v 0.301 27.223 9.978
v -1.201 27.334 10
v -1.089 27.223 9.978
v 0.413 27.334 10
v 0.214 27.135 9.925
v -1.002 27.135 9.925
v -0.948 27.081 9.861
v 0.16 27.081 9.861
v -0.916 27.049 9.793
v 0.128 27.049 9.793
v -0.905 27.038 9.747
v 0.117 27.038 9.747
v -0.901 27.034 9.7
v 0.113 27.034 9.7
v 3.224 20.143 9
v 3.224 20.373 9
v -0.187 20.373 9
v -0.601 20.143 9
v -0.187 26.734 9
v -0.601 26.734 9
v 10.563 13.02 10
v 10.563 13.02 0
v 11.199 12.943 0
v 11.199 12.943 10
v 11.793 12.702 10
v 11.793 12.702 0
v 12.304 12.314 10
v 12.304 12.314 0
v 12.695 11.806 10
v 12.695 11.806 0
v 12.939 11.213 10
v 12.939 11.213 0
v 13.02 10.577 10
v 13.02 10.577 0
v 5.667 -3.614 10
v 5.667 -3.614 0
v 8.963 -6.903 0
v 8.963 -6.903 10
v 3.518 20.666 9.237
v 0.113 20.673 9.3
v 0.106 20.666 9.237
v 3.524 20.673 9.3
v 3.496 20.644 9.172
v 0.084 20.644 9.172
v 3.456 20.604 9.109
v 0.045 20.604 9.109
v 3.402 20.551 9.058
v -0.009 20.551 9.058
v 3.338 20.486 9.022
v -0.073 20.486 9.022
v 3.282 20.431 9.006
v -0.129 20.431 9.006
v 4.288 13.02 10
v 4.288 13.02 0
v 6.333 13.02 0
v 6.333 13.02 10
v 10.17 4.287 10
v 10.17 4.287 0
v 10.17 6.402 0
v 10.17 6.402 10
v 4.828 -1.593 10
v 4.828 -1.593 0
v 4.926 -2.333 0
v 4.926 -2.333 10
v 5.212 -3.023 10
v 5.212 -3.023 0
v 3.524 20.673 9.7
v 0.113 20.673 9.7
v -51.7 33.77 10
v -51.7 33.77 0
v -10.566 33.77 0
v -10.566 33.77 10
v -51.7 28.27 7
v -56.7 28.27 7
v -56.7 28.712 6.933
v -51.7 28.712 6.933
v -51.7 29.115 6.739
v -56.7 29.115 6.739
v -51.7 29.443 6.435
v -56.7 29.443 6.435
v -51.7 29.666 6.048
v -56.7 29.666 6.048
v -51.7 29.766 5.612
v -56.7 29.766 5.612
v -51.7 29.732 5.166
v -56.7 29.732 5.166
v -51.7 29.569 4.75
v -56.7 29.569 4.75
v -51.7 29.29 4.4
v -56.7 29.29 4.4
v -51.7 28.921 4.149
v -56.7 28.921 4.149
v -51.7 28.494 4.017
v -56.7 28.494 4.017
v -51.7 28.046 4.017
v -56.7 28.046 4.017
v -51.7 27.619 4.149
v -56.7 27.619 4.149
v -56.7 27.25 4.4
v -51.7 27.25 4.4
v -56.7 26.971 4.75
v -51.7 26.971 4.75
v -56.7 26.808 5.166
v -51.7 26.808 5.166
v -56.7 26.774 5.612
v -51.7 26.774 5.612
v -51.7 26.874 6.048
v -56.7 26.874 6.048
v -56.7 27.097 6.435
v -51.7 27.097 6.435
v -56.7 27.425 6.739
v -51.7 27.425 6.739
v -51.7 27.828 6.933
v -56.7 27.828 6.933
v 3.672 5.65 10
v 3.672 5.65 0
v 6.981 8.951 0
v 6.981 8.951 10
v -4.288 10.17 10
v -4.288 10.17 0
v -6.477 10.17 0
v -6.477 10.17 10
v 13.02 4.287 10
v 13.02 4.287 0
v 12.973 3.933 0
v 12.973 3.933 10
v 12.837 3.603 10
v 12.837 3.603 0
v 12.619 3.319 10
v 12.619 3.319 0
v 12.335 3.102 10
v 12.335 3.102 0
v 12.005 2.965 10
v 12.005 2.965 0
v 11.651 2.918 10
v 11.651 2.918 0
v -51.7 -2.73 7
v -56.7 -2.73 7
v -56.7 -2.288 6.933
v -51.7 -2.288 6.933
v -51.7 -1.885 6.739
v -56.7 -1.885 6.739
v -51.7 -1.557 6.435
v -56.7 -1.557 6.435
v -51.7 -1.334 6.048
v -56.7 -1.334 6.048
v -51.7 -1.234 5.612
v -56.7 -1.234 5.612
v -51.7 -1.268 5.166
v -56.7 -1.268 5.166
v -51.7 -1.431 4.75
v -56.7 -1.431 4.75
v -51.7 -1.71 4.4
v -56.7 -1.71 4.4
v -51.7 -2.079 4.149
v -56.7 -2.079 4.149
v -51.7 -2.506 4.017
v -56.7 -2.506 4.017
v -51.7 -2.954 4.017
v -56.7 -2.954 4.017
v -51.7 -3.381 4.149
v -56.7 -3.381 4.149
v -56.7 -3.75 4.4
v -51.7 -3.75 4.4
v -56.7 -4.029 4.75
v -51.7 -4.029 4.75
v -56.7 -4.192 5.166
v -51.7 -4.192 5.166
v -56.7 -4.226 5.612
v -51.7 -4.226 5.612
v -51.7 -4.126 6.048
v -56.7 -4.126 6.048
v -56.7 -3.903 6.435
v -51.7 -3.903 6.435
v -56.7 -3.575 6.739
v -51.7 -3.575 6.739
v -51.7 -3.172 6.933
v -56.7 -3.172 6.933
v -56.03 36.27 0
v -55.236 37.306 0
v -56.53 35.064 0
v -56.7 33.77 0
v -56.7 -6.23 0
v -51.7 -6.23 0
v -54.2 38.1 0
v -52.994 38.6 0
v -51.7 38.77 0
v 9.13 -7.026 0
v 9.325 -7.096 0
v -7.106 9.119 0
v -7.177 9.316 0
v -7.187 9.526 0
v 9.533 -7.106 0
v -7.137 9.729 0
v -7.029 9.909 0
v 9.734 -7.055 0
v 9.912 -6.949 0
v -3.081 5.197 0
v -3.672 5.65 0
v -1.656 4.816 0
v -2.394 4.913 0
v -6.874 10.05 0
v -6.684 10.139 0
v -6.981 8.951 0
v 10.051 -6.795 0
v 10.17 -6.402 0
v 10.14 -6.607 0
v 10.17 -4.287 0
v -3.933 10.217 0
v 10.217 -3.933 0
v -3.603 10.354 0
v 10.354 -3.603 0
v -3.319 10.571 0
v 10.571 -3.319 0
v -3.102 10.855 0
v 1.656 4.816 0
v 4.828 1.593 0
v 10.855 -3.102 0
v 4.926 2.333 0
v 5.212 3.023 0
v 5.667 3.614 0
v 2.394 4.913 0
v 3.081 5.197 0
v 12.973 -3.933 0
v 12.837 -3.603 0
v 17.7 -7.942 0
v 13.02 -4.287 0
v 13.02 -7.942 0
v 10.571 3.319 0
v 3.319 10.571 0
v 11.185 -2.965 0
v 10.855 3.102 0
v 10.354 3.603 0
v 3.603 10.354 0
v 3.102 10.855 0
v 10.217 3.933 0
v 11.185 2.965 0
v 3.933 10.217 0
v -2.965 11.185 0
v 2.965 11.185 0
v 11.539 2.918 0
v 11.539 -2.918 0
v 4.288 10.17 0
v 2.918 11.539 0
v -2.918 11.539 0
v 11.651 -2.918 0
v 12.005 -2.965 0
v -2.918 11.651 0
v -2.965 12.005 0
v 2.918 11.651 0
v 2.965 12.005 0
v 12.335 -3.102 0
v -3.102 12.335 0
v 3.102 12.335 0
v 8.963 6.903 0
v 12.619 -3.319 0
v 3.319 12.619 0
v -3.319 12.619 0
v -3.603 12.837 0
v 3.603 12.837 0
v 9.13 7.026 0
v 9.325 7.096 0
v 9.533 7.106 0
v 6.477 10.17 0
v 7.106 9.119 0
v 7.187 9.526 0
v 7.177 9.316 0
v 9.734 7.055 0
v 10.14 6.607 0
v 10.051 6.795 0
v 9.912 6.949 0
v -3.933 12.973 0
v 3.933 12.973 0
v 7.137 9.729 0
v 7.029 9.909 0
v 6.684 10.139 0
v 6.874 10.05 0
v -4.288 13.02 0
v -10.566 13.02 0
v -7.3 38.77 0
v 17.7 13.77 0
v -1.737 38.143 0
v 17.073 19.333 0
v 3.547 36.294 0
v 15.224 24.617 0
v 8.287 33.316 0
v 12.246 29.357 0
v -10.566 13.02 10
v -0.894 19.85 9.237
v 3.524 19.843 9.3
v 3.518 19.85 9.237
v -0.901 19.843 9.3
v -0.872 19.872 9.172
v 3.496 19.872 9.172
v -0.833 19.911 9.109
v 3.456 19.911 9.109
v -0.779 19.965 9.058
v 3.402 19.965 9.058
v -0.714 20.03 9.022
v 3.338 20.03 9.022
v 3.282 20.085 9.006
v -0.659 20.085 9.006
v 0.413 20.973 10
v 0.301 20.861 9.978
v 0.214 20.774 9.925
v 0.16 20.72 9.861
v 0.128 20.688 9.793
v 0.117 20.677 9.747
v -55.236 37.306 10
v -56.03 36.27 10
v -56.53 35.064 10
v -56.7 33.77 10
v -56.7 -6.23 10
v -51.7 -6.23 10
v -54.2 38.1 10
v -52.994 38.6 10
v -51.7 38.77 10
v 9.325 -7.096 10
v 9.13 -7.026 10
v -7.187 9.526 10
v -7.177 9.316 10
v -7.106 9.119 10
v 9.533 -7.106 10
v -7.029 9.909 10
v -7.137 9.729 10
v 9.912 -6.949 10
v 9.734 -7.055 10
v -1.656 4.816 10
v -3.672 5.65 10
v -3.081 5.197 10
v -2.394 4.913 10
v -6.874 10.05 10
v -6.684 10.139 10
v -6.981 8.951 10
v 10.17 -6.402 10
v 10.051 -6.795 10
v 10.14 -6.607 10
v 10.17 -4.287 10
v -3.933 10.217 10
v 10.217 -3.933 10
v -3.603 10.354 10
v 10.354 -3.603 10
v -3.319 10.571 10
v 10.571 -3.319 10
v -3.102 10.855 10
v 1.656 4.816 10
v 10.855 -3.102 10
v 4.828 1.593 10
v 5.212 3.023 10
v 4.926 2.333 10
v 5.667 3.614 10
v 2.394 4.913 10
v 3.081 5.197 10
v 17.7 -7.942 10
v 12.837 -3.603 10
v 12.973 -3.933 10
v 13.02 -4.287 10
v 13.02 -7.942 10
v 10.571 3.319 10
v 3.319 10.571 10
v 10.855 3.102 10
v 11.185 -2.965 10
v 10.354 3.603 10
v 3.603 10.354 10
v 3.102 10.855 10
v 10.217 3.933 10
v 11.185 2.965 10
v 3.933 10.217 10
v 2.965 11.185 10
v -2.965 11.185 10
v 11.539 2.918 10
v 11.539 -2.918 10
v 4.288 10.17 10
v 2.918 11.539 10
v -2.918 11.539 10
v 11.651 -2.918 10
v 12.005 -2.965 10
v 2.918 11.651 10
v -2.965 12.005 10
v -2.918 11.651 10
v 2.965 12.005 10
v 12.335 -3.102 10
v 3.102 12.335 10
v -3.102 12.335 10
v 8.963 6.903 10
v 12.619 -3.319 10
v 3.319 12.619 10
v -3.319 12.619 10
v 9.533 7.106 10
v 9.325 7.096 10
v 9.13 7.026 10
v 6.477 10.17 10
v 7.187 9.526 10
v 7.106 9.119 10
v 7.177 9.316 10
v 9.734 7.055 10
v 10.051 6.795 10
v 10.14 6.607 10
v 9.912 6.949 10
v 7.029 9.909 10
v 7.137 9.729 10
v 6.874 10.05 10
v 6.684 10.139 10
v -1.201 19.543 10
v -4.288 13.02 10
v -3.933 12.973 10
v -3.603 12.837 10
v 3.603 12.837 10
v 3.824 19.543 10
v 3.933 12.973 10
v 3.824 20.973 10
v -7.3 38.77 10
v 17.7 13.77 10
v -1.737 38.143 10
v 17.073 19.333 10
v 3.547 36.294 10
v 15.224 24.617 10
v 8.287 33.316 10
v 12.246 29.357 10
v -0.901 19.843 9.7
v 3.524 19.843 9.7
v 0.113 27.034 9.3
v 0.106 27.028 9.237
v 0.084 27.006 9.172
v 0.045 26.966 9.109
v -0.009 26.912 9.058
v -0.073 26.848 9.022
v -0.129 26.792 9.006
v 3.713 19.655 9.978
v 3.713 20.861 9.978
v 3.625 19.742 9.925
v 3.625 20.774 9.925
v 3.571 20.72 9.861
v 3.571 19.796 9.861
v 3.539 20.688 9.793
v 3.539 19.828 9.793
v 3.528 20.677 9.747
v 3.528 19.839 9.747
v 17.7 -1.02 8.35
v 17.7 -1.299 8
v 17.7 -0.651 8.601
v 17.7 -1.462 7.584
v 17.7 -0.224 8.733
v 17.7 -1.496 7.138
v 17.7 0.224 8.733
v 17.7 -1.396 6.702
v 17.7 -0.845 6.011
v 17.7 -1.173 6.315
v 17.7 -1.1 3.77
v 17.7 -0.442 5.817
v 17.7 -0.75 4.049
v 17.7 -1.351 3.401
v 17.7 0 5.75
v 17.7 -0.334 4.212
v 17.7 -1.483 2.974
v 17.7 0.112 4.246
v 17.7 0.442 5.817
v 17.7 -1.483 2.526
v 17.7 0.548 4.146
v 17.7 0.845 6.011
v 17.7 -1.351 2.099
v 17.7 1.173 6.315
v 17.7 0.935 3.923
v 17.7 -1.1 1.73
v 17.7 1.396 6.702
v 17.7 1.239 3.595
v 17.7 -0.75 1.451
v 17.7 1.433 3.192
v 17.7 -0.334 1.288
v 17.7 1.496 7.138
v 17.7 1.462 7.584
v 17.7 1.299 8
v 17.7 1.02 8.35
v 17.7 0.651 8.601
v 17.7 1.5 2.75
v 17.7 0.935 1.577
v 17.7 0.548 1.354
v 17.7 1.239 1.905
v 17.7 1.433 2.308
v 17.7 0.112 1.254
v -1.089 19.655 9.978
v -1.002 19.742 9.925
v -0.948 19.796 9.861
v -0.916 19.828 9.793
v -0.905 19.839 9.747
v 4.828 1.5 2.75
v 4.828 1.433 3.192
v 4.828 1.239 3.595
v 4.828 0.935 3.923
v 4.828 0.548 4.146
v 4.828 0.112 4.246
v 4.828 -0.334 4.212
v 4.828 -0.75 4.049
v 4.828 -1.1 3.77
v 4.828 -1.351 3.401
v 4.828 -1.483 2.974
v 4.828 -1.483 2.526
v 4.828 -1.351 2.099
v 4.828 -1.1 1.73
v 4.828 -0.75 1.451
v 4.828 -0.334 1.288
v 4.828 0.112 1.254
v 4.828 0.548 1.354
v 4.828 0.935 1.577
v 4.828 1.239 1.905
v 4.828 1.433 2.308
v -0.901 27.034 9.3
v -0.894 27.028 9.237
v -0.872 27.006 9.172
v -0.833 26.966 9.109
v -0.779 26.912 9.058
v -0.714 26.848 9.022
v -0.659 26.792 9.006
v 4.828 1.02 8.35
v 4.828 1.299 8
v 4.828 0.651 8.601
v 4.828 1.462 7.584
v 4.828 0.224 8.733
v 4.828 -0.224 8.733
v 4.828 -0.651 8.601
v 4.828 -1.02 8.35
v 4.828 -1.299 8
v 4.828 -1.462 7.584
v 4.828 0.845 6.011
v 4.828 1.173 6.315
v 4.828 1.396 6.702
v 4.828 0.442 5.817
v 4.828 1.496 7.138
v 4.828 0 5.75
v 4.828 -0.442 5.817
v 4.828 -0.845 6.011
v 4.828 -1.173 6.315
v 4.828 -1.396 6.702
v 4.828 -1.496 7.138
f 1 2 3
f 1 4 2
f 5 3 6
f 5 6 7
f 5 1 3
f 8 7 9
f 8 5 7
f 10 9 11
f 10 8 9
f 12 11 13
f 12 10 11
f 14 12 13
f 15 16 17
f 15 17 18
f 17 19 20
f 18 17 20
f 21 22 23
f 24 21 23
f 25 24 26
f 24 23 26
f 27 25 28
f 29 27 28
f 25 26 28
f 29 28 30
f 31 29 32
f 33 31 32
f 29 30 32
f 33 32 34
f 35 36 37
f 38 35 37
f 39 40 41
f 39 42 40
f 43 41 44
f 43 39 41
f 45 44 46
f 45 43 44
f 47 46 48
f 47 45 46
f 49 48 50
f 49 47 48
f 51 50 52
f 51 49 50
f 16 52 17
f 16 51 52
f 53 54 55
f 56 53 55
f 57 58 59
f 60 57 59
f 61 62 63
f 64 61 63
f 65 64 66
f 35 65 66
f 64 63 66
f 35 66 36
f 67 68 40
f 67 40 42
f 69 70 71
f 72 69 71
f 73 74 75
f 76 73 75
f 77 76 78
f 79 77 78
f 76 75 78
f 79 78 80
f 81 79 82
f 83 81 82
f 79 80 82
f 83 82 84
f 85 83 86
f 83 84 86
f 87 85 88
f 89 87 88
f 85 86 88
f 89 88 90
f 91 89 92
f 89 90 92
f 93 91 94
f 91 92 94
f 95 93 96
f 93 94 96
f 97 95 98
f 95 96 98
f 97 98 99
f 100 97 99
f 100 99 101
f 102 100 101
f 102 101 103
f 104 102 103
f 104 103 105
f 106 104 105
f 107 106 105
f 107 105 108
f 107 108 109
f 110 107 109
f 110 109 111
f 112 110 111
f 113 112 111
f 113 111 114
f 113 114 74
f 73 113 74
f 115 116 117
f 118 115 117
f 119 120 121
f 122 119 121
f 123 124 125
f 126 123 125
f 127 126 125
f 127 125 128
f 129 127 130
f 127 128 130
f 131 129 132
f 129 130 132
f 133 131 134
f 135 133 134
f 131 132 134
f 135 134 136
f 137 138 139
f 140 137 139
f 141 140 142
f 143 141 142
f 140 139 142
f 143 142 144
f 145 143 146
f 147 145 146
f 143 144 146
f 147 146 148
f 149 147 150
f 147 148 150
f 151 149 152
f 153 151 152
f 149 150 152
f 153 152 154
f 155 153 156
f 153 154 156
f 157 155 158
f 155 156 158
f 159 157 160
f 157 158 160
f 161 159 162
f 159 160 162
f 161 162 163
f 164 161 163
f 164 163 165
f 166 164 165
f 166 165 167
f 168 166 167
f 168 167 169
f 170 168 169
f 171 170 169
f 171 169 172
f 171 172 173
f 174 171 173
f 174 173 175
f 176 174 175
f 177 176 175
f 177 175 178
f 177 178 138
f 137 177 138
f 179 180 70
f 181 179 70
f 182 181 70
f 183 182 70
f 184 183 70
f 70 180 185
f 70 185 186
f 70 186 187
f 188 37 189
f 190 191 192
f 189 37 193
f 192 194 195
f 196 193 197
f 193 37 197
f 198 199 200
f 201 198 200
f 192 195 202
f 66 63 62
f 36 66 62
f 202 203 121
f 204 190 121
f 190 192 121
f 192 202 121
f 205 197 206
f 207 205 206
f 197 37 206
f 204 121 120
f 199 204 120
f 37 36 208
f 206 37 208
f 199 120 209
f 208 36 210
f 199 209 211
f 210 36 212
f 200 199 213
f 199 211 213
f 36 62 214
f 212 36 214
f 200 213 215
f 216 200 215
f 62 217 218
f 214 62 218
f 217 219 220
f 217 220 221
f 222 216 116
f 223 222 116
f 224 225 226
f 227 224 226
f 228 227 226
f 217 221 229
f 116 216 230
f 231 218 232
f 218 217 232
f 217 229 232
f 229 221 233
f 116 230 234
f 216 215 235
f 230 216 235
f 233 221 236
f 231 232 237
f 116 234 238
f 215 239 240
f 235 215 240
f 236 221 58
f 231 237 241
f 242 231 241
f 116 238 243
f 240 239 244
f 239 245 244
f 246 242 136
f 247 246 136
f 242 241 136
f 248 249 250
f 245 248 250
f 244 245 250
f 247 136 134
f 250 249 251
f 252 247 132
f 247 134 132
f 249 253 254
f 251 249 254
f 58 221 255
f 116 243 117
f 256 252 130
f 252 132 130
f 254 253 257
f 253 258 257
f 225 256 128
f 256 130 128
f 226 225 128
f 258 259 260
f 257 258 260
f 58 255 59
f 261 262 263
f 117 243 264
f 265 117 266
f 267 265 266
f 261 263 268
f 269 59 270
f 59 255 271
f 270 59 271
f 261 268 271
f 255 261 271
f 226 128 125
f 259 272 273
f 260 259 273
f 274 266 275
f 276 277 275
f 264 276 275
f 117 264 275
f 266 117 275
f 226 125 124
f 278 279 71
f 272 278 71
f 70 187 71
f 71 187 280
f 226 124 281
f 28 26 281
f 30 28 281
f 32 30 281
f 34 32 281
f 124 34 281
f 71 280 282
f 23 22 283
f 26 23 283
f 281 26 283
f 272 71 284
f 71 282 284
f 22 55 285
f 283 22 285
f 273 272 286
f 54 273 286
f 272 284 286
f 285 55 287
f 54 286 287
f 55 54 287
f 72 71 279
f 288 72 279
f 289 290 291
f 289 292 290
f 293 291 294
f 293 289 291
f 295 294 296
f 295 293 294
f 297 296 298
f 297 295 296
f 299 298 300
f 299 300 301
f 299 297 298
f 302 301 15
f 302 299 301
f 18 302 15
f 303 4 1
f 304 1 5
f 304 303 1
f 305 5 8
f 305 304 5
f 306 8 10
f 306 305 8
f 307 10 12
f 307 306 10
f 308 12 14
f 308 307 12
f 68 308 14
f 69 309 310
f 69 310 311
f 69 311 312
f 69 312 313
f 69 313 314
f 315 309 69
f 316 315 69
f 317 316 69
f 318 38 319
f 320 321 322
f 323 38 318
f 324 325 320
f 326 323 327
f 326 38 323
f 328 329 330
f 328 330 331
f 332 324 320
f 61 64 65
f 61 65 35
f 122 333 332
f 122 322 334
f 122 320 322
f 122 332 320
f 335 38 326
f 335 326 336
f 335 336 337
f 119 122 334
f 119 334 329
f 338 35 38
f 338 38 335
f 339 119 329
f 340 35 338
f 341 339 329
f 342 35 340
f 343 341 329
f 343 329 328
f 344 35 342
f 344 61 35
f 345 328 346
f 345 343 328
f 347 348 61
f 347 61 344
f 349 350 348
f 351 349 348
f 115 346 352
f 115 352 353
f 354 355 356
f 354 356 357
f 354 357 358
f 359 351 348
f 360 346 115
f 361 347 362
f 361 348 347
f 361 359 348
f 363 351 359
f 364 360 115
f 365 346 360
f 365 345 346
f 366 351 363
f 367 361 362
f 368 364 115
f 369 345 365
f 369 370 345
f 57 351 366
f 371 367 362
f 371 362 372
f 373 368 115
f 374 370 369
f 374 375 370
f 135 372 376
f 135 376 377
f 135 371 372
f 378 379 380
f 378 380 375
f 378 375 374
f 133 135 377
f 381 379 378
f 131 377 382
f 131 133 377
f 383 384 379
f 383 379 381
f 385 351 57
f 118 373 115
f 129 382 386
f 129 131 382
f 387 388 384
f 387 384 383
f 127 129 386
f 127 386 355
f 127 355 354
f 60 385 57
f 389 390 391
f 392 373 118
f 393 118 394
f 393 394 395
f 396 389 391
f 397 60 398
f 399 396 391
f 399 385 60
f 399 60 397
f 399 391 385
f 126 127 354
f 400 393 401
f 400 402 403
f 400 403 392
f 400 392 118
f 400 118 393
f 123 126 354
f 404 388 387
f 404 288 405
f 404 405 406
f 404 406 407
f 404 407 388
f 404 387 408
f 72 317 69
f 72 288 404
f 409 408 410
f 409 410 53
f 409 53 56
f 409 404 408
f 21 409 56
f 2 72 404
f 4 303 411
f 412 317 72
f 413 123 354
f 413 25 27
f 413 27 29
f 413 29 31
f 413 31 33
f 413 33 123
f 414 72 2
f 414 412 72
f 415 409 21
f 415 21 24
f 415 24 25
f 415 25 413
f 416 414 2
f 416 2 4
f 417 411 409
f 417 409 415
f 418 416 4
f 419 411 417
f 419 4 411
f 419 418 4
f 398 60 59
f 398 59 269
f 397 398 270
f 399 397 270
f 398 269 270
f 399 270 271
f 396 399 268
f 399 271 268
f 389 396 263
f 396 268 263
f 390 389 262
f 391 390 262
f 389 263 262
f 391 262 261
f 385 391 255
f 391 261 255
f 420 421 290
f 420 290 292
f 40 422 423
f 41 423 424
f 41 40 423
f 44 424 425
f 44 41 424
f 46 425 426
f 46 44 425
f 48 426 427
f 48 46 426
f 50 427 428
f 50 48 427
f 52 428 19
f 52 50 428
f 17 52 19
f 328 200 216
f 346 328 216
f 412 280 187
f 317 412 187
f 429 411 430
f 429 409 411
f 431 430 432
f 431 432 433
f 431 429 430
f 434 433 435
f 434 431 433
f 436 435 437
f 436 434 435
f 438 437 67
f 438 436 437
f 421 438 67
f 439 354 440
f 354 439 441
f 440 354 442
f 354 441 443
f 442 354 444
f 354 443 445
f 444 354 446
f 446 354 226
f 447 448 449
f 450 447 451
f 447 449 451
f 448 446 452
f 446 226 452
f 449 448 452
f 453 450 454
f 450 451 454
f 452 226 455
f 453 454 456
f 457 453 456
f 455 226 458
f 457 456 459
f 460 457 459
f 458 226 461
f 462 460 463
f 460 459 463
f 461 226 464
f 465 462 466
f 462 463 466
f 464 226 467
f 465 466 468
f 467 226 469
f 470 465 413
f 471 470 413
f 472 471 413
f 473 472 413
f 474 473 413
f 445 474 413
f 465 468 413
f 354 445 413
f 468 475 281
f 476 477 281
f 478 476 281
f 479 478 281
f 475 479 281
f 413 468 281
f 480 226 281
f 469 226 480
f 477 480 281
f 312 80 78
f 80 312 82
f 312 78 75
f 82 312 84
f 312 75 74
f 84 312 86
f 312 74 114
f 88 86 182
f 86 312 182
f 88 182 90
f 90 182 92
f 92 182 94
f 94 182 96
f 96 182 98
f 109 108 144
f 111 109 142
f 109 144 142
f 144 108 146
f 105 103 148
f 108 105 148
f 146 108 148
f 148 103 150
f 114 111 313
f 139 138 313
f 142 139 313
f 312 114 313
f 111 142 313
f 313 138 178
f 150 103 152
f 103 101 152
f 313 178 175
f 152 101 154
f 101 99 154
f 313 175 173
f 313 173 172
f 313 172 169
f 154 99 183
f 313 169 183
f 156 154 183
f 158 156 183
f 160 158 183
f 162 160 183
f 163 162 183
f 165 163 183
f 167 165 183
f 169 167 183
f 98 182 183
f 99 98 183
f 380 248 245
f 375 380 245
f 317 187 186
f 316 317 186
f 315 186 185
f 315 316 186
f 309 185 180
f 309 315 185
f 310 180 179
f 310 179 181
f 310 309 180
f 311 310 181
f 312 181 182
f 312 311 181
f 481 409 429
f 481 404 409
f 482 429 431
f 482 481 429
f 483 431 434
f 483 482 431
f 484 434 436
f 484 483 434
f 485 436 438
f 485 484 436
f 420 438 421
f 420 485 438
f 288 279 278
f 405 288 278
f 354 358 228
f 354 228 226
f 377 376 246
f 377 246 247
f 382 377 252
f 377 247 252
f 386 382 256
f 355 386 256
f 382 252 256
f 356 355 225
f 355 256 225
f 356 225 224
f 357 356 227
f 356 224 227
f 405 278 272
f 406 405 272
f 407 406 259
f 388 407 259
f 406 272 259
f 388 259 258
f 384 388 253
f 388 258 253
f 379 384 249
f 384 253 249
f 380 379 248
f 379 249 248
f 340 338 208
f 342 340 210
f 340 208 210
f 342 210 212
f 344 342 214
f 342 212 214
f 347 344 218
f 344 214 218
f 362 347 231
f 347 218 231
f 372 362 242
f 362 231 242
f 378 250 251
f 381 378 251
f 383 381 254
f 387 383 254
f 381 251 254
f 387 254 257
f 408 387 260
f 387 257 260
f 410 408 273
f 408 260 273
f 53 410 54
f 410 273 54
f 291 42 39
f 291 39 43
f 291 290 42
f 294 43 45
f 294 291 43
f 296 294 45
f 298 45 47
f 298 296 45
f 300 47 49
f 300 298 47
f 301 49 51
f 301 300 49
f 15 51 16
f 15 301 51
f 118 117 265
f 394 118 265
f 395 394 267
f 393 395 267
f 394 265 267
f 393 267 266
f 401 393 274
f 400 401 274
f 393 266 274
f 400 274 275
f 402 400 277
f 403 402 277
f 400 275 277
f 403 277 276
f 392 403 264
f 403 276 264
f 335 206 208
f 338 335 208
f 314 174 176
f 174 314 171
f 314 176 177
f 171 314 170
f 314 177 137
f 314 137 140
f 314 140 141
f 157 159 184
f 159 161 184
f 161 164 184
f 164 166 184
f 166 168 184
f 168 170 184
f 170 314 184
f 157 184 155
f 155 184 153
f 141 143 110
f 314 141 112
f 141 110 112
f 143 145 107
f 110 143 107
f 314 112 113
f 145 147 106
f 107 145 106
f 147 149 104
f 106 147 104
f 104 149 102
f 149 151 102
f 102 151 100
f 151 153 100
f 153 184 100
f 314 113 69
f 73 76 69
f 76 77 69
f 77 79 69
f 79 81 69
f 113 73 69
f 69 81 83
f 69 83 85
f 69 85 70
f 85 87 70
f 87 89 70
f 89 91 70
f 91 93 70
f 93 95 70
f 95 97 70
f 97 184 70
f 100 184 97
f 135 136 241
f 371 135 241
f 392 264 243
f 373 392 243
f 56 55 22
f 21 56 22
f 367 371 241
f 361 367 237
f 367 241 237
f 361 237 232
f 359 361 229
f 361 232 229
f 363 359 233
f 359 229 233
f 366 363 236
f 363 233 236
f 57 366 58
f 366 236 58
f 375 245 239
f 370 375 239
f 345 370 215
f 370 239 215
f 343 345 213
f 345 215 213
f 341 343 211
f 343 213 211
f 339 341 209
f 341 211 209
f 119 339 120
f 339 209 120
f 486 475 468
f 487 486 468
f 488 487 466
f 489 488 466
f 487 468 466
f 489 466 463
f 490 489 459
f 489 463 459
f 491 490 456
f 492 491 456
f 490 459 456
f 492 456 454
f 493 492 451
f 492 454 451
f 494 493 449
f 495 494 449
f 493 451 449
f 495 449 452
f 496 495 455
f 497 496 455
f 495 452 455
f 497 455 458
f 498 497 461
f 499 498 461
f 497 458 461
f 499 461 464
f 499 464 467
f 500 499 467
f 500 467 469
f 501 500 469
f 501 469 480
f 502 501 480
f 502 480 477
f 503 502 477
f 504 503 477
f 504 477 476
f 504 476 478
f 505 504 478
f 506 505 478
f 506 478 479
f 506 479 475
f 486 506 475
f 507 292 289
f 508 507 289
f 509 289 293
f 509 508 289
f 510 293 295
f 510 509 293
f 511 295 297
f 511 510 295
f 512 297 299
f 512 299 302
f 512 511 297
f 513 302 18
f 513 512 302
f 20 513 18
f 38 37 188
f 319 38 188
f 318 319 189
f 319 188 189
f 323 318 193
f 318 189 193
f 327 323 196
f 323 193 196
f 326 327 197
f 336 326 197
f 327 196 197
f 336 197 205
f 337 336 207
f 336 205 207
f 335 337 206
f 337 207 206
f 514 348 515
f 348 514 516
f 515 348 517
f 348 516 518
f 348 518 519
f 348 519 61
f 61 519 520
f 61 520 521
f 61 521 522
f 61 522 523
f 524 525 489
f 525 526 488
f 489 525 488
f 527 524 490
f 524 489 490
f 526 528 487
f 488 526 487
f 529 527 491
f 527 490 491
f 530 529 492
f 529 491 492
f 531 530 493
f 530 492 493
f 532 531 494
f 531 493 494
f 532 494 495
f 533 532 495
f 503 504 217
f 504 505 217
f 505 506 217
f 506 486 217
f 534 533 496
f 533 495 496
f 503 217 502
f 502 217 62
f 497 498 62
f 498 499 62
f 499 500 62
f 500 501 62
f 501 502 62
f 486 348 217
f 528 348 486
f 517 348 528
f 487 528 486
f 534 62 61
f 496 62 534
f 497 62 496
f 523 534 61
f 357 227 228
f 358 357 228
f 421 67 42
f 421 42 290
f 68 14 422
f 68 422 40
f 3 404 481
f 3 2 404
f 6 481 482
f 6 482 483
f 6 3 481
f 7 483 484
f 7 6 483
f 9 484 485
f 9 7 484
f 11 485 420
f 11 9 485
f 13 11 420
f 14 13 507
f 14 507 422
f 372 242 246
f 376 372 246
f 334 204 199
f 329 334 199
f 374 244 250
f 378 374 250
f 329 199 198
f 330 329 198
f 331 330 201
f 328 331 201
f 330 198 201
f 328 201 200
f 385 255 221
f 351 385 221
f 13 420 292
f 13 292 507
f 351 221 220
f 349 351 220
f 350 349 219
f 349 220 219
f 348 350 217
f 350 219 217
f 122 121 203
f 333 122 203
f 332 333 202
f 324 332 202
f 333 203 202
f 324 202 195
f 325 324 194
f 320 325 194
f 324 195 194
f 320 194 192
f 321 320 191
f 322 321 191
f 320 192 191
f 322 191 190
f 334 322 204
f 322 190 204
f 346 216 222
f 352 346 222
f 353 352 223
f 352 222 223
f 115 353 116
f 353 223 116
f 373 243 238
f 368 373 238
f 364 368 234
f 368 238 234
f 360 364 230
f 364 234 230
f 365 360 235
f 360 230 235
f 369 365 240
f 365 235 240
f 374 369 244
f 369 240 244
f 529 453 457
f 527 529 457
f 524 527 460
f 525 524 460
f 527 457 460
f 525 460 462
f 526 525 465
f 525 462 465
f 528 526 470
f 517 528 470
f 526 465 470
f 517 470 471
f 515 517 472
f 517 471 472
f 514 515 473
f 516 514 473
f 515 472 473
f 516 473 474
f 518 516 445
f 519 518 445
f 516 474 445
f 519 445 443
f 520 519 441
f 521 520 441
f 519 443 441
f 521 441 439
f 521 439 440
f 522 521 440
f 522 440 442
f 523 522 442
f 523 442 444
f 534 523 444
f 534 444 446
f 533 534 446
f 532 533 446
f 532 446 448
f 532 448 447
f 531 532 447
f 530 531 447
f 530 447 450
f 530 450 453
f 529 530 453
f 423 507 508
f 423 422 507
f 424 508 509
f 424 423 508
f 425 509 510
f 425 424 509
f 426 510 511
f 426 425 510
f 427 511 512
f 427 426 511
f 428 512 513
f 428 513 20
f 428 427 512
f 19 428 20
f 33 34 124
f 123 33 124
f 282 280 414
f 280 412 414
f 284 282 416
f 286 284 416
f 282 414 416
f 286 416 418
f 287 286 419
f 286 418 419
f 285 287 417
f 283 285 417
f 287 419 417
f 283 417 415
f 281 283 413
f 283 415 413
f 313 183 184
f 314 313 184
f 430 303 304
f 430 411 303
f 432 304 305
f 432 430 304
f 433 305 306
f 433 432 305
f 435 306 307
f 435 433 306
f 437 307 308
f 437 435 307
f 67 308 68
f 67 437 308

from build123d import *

# Parameters (mm, degrees)
BOSS_EXTRUDE1_DEPTH = 10
CUT_EXTRUDE1_REACH  = 86.489
SKETCH2_R           = 1.5
FILLET3_R           = 5
CUT_EXTRUDE2_REACH  = 86.489
SKETCH3_R           = 1.5
FILLET4_R           = 25
CUT_EXTRUDE7_DEPTH  = 1
FILLET8_R           = 0.3


with BuildPart() as part:
    # Sketch1 → Boss-Extrude1 (new body)
    with BuildSketch(Plane.XY):
        with BuildLine():
            Line((13.02, -7.9417418), (17.7, -7.9417418))
            Line((17.7, -7.9417418), (17.7, 38.77))
            Line((17.7, 38.77), (-56.7, 38.77))
            Line((-56.7, 38.77), (-56.7, -6.23))
            Line((-56.7, -6.23), (-51.7, -6.23))
            Line((-51.7, -6.23), (-51.7, 33.77))
            Line((-51.7, 33.77), (-10.566443095, 33.77))
            Line((-10.566443095, 33.77), (-10.566443095, 13.02))
            Line((-10.566443095, 13.02), (-5.317126718, 13.02))
            Line((-5.317126718, 13.02), (-4.287512407, 13.02))
            ThreePointArc((-4.287512407, 13.02), (-3.319474451, 12.619025549), (-2.9185, 11.650987593))
            Line((-2.9185, 11.650987593), (-2.9185, 11.539212407))
            ThreePointArc((-2.9185, 11.539212407), (-3.319474451, 10.571174451), (-4.287512407, 10.1702))
            Line((-4.287512407, 10.1702), (-6.476788598, 10.1702))
            ThreePointArc((-6.476788598, 10.1702), (-7.136510935, 9.729114651), (-6.981020848, 8.950903446))
            Line((-6.981020848, 8.950903446), (-3.672257405, 5.649701928))
            ThreePointArc((-3.672257405, 5.649701928), (-2.746830644, 5.032499411), (-1.655778399, 4.8158))
            Line((-1.655778399, 4.8158), (1.655778399, 4.8158))
            ThreePointArc((1.655778399, 4.8158), (2.746830644, 5.032499411), (3.672257405, 5.649701928))
            Line((3.672257405, 5.649701928), (6.981020848, 8.950903446))
            ThreePointArc((6.981020848, 8.950903446), (7.136510935, 9.729114651), (6.476788598, 10.1702))
            Line((6.476788598, 10.1702), (4.287512407, 10.1702))
            ThreePointArc((4.287512407, 10.1702), (3.319474451, 10.571174451), (2.9185, 11.539212407))
            Line((2.9185, 11.539212407), (2.9185, 11.650987593))
            ThreePointArc((2.9185, 11.650987593), (3.319474451, 12.619025549), (4.287512407, 13.02))
            Line((4.287512407, 13.02), (6.332886163, 13.02))
            Line((6.332886163, 13.02), (10.562594215, 13.019824354))
            ThreePointArc((10.562594215, 13.019824354), (12.303594776, 12.313982883), (13.019956614, 10.577284622))
            Line((13.019956614, 10.577284622), (13.02, 4.287469289))
            ThreePointArc((13.02, 4.287469289), (12.619025549, 3.319431332), (11.650987593, 2.918456882))
            Line((11.650987593, 2.918456882), (11.539212407, 2.918456882))
            ThreePointArc((11.539212407, 2.918456882), (10.571174451, 3.319431332), (10.1702, 4.287469289))
            Line((10.1702, 4.287469289), (10.1702, 6.402089023))
            ThreePointArc((10.1702, 6.402089023), (9.733877283, 7.055496588), (8.963146507, 6.90287605))
            Line((8.963146507, 6.90287605), (5.667020993, 3.614283579))
            ThreePointArc((5.667020993, 3.614283579), (5.046449321, 2.687255303), (4.8285, 1.593185507))
            Line((4.8285, 1.593185507), (4.8285, -1.593185507))
            ThreePointArc((4.8285, -1.593185507), (5.046449321, -2.687255303), (5.667020993, -3.614283579))
            Line((5.667020993, -3.614283579), (8.963146507, -6.90287605))
            ThreePointArc((8.963146507, -6.90287605), (9.733877283, -7.055496588), (10.1702, -6.402089023))
            Line((10.1702, -6.402089023), (10.1702, -4.287469289))
            ThreePointArc((10.1702, -4.287469289), (10.571174451, -3.319431332), (11.539212407, -2.918456882))
            Line((11.539212407, -2.918456882), (11.650987593, -2.918456882))
            ThreePointArc((11.650987593, -2.918456882), (12.619025549, -3.319431332), (13.02, -4.287469289))
            Line((13.02, -4.287469289), (13.02, -5.3170836))
            Line((13.02, -5.3170836), (13.02, -7.9417418))
        make_face()
    extrude(amount=BOSS_EXTRUDE1_DEPTH)

    # Sketch2 → Cut-Extrude1 (cut, up to next)
    with BuildSketch(Plane.ZY.offset(56.7), mode=Mode.PRIVATE) as cut_extrude1_sk1:
        with Locations((5.5, -2.73)):
            Circle(SKETCH2_R)
    cut_extrude1_tool1 = extrude(cut_extrude1_sk1.sketch, amount=-CUT_EXTRUDE1_REACH, mode=Mode.PRIVATE) & part.part
    # Sketch2 → Cut-Extrude1 (cut, up to next)
    with BuildSketch(Plane.ZY.offset(56.7), mode=Mode.PRIVATE) as cut_extrude1_sk2:
        with Locations((5.5, 28.27)):
            Circle(SKETCH2_R)
    cut_extrude1_tool2 = extrude(cut_extrude1_sk2.sketch, amount=-CUT_EXTRUDE1_REACH, mode=Mode.PRIVATE) & part.part
    add(cut_extrude1_tool1.solids().sort_by_distance((-56.7, -2.73, 5.5))[0], mode=Mode.SUBTRACT)
    add(cut_extrude1_tool2.solids().sort_by_distance((-56.7, 28.27, 5.5))[0], mode=Mode.SUBTRACT)

    # Fillet3
    fillet3_edges = [part.edges().sort_by_distance(p)[0] for p in [
        (-56.7, 38.77, 5),
    ]]
    fillet(fillet3_edges, radius=FILLET3_R)

    # Sketch3 → Cut-Extrude2 (cut, up to next)
    with BuildSketch(Plane(origin=(17.7, 0, 0), x_dir=(0, 0, -1), z_dir=(1, 0, 0)), mode=Mode.PRIVATE) as cut_extrude2_sk1:
        with Locations((-7.25, 0)):
            Circle(SKETCH3_R)
    cut_extrude2_tool1 = extrude(cut_extrude2_sk1.sketch, amount=-CUT_EXTRUDE2_REACH, mode=Mode.PRIVATE) & part.part
    # Sketch3 → Cut-Extrude2 (cut, up to next)
    with BuildSketch(Plane(origin=(17.7, 0, 0), x_dir=(0, 0, -1), z_dir=(1, 0, 0)), mode=Mode.PRIVATE) as cut_extrude2_sk2:
        with Locations(Location((-2.75, 0, 0), (0, 0, 90))):
            Circle(SKETCH3_R)
    cut_extrude2_tool2 = extrude(cut_extrude2_sk2.sketch, amount=-CUT_EXTRUDE2_REACH, mode=Mode.PRIVATE) & part.part
    add(cut_extrude2_tool1.solids().sort_by_distance((17.7, 0, 7.25))[0], mode=Mode.SUBTRACT)
    add(cut_extrude2_tool2.solids().sort_by_distance((17.7, 0, 2.75))[0], mode=Mode.SUBTRACT)

    # Fillet4
    fillet4_edges = [part.edges().sort_by_distance(p)[0] for p in [
        (17.7, 38.77, 5),
    ]]
    fillet(fillet4_edges, radius=FILLET4_R)

    # Sketch7 → Cut-Extrude7 (cut)
    with BuildSketch(Plane.XY.offset(10)):
        Polygon((-0.90100078, 19.84300121), (-0.90100078, 27.034293528), (0.113155829, 27.034293528), (0.113155829, 20.672765708), (3.524409877, 20.672765708), (3.524409877, 19.84300121), align=None)
    extrude(amount=-CUT_EXTRUDE7_DEPTH, mode=Mode.SUBTRACT)

    # Fillet8
    fillet8_edges = [part.edges().sort_by_distance(p)[0] for p in [
        (1.311704549, 19.84300121, 10),
        (-0.90100078, 23.438647369, 10),
        (-0.393922475, 27.034293528, 10),
        (0.113155829, 23.853529618, 10),
        (1.818782853, 20.672765708, 10),
        (3.524409877, 20.257883459, 10),
        (1.311704549, 19.84300121, 9),
        (-0.90100078, 23.438647369, 9),
        (-0.393922475, 27.034293528, 9),
        (0.113155829, 23.853529618, 9),
        (1.818782853, 20.672765708, 9),
        (3.524409877, 20.257883459, 9),
    ]]
    fillet(fillet8_edges, radius=FILLET8_R)


solid = part.part
